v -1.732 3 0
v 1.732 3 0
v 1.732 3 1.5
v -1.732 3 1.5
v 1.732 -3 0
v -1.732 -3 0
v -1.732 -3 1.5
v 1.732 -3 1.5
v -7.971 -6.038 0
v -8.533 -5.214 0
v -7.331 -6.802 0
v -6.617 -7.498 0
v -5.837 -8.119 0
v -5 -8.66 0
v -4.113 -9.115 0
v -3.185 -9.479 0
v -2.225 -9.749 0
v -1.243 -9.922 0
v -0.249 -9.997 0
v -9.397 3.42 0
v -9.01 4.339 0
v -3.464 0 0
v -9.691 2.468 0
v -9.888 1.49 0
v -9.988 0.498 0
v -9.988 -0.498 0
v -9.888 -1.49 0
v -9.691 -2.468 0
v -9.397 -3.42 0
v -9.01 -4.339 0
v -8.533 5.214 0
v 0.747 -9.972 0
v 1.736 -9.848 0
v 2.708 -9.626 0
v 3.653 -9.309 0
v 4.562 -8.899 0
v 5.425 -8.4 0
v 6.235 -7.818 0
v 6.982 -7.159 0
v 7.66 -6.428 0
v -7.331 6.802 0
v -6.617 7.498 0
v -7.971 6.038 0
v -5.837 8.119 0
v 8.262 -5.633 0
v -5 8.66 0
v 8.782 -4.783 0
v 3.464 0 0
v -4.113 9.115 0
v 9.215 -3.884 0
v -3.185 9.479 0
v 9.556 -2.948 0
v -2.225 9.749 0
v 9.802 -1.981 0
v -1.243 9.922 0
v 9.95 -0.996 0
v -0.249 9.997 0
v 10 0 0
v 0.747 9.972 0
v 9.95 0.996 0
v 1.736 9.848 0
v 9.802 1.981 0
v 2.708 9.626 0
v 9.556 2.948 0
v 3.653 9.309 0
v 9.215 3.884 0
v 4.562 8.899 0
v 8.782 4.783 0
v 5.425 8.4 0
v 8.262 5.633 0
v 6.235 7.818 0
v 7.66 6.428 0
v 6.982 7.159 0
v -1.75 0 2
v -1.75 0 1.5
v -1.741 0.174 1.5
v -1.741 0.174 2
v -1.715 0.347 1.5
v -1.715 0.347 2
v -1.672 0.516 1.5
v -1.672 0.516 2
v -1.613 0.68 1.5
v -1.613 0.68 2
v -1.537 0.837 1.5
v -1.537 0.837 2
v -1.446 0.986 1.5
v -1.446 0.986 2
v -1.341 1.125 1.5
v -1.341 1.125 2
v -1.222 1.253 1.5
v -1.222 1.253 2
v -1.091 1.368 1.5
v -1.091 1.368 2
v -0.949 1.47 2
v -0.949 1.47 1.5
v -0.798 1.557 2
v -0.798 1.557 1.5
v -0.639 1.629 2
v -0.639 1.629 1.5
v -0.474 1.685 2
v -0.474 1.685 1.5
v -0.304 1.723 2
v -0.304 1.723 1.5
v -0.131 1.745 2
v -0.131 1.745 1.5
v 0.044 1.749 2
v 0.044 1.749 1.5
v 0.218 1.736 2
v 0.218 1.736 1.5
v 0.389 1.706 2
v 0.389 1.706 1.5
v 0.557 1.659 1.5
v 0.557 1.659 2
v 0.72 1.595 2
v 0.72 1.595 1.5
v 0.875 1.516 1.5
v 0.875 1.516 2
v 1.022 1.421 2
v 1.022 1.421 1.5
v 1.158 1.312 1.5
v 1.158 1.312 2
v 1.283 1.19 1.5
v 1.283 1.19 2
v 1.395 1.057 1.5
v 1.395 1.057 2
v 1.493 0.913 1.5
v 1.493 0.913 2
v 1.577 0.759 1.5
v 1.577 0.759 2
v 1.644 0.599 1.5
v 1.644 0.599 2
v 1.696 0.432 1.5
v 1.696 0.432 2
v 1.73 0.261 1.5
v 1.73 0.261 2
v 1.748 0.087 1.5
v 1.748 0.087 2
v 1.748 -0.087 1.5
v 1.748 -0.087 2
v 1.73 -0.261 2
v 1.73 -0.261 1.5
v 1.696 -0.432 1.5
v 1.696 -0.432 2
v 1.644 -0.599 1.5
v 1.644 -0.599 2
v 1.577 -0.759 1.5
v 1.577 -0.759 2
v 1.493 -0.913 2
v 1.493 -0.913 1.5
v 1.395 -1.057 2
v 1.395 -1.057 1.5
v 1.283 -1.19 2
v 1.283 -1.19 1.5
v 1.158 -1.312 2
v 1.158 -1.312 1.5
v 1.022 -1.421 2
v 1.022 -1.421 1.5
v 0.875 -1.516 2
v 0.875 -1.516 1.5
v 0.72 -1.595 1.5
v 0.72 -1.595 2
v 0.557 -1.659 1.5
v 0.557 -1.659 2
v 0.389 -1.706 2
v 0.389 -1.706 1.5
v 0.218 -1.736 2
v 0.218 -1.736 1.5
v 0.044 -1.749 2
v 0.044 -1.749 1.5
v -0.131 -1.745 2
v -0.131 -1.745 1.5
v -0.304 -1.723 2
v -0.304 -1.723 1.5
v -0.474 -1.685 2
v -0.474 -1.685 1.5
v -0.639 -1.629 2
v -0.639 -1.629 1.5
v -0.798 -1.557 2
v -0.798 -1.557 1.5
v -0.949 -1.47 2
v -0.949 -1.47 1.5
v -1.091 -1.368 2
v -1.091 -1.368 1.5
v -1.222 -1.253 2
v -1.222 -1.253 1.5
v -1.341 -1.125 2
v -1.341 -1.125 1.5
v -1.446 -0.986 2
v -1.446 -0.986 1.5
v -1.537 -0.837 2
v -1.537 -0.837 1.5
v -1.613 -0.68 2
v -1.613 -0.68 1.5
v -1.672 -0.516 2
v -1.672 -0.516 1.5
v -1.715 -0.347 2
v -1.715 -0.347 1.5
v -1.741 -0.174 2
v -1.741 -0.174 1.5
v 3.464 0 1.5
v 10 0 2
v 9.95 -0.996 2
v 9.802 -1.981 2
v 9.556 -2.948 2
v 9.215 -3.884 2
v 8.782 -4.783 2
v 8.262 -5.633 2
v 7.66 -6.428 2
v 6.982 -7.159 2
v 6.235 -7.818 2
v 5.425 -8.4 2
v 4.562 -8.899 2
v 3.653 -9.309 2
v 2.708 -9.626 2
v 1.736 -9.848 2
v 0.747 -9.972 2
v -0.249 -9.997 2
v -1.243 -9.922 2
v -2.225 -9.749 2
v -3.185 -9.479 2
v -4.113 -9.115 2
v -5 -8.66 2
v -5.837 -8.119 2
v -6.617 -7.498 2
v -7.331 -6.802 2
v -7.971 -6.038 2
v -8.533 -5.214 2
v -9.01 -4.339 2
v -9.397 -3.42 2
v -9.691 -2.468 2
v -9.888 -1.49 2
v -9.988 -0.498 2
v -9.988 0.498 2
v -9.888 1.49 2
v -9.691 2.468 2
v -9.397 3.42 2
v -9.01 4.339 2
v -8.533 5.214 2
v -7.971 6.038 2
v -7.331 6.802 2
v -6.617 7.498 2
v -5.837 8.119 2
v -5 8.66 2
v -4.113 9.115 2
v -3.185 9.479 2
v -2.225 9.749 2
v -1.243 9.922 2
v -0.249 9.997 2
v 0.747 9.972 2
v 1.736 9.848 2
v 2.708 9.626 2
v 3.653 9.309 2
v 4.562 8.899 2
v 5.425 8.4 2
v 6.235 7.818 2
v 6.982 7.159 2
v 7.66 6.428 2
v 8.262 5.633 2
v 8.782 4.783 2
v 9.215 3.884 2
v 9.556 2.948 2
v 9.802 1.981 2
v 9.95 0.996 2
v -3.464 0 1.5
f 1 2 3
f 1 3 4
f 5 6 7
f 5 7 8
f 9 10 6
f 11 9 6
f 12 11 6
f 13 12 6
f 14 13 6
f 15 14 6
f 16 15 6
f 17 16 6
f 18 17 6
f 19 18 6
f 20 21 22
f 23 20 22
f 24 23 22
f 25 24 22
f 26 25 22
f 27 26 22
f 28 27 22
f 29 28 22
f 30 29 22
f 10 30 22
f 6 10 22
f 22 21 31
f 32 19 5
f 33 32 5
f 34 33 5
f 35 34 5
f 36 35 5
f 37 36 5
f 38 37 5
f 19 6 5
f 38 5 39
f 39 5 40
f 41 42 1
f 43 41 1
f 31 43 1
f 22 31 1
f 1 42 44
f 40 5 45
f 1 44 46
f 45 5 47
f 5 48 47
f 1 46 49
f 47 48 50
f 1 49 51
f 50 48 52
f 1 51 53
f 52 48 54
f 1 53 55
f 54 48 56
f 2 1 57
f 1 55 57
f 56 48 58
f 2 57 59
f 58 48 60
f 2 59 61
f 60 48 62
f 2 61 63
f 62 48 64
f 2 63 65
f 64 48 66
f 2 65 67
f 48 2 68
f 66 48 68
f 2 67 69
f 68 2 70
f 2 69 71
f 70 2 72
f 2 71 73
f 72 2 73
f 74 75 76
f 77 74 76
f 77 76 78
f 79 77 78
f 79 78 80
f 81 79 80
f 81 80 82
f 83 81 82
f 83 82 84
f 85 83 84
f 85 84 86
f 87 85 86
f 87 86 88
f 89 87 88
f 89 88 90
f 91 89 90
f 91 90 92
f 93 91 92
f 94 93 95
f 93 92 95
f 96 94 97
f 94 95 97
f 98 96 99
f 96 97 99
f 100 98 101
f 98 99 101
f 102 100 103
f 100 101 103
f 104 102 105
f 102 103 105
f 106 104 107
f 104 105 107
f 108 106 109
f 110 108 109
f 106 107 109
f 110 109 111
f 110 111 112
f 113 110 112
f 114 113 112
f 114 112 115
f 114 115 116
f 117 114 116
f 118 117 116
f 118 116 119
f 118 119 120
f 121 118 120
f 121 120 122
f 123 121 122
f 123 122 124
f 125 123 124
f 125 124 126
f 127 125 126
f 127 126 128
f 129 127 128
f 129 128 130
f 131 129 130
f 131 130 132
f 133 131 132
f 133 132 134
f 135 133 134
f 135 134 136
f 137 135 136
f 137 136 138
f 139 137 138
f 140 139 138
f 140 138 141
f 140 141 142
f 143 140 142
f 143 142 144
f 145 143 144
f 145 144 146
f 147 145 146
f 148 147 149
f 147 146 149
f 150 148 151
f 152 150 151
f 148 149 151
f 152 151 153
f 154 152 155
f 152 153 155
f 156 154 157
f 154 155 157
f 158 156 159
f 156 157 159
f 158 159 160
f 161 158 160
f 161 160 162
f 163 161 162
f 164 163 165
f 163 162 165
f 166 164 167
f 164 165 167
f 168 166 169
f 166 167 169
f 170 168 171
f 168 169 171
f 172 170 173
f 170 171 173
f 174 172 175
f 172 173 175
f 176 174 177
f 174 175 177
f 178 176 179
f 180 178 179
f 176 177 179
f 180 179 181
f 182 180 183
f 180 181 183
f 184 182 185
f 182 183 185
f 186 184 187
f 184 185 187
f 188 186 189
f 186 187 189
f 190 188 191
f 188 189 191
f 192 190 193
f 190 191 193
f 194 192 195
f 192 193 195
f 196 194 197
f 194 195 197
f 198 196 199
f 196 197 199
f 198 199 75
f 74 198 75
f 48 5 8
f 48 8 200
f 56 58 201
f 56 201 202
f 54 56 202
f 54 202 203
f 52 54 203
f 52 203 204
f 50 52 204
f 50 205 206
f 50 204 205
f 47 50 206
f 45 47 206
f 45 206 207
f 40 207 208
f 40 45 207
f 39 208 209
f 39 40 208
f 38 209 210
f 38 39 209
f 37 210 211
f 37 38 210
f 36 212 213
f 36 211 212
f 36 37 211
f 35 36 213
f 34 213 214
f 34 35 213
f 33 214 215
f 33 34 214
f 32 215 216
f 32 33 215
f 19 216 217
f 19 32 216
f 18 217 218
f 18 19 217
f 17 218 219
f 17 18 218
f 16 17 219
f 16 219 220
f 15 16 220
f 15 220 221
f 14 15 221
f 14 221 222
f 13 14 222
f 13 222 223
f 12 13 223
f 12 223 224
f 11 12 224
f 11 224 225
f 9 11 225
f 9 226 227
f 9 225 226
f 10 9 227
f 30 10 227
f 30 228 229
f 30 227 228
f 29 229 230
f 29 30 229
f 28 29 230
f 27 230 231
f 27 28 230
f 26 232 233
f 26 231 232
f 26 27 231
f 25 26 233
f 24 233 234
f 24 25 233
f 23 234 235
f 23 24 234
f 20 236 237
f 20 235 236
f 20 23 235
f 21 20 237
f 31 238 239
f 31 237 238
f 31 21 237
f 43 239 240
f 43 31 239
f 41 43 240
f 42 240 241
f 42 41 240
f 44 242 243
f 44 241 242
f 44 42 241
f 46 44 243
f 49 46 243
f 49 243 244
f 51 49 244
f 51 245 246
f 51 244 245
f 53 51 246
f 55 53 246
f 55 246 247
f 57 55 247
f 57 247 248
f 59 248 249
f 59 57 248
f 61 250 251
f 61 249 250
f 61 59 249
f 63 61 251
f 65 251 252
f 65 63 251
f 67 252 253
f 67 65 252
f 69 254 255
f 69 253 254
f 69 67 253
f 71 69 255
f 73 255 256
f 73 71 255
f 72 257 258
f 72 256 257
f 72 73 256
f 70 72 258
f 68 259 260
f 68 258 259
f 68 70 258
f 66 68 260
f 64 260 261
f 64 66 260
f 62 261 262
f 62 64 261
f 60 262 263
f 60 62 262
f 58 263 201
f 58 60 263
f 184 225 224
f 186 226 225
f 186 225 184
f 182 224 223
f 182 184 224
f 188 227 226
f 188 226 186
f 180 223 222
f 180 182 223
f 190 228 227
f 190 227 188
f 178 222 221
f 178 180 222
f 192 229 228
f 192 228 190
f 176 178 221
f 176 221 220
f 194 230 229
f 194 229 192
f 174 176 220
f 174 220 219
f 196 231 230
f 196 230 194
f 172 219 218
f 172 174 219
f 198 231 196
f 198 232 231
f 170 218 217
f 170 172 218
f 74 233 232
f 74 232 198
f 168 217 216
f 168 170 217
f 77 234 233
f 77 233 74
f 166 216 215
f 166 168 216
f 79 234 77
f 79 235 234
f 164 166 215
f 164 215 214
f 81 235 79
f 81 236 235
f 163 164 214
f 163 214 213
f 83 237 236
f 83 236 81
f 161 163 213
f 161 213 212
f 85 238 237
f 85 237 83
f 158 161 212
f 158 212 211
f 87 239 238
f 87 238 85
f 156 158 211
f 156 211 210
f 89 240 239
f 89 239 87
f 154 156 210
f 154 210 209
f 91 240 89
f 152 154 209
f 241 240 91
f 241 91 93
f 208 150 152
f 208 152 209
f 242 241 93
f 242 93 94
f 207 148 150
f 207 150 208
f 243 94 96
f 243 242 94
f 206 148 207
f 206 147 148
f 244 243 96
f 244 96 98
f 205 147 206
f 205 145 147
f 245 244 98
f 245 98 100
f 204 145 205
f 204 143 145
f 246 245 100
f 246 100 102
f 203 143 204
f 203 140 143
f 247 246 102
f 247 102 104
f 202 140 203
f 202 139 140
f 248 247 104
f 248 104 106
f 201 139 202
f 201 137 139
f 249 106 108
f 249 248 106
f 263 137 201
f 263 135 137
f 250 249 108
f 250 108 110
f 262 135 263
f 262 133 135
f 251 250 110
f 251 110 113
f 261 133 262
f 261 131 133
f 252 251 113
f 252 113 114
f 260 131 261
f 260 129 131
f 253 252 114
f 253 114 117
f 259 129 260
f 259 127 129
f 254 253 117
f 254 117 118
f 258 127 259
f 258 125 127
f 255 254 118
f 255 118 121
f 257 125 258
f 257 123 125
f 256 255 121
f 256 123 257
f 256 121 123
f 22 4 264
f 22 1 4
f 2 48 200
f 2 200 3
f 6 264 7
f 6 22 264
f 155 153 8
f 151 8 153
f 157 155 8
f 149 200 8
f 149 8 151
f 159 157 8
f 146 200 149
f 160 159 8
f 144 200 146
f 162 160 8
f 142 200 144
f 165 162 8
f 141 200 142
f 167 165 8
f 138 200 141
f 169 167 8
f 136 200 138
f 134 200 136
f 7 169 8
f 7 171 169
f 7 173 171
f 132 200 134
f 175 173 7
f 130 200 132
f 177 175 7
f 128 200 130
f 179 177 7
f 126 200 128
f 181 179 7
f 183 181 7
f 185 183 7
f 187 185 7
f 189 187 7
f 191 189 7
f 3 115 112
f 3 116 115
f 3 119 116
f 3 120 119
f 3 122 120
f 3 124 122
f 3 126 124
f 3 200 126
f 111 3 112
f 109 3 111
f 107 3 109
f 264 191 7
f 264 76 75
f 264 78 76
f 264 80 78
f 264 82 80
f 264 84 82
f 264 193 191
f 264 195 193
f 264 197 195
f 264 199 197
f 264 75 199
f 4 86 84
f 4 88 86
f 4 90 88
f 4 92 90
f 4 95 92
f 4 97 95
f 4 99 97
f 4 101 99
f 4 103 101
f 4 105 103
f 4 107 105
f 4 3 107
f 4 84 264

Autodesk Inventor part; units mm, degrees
ref_plane "YZ Plane" through (0, 0, 0) normal (1, 0, 0) x (0, 1, 0)
ref_plane "XZ Plane" through (0, 0, 0) normal (0, 1, 0) x (-1, 0, 0)
ref_plane "XY Plane" through (0, 0, 0) normal (0, 0, 1) x (1, 0, 0)
sketch "Эскиз1" plane through (0, 0, 0) normal (0, 0, 1) x (1, 0, 0)
  circle A0 centre (0, 0) radius 10
  dimension "d0" = 20
extrude "Выдавливание1" add sketch "Эскиз1" along normal blind 2
sketch "Эскиз2" plane through (0, 0, 0) normal (0, 0, -1) x (-1, 0, 0)
  circle A0 centre (0, 0) radius 3 construction
  line L0 (1.7321, 3) -> (3.4641, 0)
  line L1 (3.4641, 0) -> (1.7321, -3)
  line L2 (1.7321, -3) -> (-1.7321, -3)
  line L3 (-1.7321, -3) -> (-3.4641, 0)
  line L4 (-3.4641, 0) -> (-1.7321, 3)
  line L5 (-1.7321, 3) -> (1.7321, 3)
  point P0 (0, 3)
  dimension "d3" = 6
extrude "Выдавливание2" cut sketch "Эскиз2" against normal blind 1.5
sketch "Эскиз3" plane through (0, 0, 1.5) normal (0, 0, -1) x (-1, 0, 0)
  circle A0 centre (0, 0) radius 1.75
  dimension "d6" = 3.5
extrude "Выдавливание3" cut sketch "Эскиз3" against normal blind 10
properties part number "hand2"
